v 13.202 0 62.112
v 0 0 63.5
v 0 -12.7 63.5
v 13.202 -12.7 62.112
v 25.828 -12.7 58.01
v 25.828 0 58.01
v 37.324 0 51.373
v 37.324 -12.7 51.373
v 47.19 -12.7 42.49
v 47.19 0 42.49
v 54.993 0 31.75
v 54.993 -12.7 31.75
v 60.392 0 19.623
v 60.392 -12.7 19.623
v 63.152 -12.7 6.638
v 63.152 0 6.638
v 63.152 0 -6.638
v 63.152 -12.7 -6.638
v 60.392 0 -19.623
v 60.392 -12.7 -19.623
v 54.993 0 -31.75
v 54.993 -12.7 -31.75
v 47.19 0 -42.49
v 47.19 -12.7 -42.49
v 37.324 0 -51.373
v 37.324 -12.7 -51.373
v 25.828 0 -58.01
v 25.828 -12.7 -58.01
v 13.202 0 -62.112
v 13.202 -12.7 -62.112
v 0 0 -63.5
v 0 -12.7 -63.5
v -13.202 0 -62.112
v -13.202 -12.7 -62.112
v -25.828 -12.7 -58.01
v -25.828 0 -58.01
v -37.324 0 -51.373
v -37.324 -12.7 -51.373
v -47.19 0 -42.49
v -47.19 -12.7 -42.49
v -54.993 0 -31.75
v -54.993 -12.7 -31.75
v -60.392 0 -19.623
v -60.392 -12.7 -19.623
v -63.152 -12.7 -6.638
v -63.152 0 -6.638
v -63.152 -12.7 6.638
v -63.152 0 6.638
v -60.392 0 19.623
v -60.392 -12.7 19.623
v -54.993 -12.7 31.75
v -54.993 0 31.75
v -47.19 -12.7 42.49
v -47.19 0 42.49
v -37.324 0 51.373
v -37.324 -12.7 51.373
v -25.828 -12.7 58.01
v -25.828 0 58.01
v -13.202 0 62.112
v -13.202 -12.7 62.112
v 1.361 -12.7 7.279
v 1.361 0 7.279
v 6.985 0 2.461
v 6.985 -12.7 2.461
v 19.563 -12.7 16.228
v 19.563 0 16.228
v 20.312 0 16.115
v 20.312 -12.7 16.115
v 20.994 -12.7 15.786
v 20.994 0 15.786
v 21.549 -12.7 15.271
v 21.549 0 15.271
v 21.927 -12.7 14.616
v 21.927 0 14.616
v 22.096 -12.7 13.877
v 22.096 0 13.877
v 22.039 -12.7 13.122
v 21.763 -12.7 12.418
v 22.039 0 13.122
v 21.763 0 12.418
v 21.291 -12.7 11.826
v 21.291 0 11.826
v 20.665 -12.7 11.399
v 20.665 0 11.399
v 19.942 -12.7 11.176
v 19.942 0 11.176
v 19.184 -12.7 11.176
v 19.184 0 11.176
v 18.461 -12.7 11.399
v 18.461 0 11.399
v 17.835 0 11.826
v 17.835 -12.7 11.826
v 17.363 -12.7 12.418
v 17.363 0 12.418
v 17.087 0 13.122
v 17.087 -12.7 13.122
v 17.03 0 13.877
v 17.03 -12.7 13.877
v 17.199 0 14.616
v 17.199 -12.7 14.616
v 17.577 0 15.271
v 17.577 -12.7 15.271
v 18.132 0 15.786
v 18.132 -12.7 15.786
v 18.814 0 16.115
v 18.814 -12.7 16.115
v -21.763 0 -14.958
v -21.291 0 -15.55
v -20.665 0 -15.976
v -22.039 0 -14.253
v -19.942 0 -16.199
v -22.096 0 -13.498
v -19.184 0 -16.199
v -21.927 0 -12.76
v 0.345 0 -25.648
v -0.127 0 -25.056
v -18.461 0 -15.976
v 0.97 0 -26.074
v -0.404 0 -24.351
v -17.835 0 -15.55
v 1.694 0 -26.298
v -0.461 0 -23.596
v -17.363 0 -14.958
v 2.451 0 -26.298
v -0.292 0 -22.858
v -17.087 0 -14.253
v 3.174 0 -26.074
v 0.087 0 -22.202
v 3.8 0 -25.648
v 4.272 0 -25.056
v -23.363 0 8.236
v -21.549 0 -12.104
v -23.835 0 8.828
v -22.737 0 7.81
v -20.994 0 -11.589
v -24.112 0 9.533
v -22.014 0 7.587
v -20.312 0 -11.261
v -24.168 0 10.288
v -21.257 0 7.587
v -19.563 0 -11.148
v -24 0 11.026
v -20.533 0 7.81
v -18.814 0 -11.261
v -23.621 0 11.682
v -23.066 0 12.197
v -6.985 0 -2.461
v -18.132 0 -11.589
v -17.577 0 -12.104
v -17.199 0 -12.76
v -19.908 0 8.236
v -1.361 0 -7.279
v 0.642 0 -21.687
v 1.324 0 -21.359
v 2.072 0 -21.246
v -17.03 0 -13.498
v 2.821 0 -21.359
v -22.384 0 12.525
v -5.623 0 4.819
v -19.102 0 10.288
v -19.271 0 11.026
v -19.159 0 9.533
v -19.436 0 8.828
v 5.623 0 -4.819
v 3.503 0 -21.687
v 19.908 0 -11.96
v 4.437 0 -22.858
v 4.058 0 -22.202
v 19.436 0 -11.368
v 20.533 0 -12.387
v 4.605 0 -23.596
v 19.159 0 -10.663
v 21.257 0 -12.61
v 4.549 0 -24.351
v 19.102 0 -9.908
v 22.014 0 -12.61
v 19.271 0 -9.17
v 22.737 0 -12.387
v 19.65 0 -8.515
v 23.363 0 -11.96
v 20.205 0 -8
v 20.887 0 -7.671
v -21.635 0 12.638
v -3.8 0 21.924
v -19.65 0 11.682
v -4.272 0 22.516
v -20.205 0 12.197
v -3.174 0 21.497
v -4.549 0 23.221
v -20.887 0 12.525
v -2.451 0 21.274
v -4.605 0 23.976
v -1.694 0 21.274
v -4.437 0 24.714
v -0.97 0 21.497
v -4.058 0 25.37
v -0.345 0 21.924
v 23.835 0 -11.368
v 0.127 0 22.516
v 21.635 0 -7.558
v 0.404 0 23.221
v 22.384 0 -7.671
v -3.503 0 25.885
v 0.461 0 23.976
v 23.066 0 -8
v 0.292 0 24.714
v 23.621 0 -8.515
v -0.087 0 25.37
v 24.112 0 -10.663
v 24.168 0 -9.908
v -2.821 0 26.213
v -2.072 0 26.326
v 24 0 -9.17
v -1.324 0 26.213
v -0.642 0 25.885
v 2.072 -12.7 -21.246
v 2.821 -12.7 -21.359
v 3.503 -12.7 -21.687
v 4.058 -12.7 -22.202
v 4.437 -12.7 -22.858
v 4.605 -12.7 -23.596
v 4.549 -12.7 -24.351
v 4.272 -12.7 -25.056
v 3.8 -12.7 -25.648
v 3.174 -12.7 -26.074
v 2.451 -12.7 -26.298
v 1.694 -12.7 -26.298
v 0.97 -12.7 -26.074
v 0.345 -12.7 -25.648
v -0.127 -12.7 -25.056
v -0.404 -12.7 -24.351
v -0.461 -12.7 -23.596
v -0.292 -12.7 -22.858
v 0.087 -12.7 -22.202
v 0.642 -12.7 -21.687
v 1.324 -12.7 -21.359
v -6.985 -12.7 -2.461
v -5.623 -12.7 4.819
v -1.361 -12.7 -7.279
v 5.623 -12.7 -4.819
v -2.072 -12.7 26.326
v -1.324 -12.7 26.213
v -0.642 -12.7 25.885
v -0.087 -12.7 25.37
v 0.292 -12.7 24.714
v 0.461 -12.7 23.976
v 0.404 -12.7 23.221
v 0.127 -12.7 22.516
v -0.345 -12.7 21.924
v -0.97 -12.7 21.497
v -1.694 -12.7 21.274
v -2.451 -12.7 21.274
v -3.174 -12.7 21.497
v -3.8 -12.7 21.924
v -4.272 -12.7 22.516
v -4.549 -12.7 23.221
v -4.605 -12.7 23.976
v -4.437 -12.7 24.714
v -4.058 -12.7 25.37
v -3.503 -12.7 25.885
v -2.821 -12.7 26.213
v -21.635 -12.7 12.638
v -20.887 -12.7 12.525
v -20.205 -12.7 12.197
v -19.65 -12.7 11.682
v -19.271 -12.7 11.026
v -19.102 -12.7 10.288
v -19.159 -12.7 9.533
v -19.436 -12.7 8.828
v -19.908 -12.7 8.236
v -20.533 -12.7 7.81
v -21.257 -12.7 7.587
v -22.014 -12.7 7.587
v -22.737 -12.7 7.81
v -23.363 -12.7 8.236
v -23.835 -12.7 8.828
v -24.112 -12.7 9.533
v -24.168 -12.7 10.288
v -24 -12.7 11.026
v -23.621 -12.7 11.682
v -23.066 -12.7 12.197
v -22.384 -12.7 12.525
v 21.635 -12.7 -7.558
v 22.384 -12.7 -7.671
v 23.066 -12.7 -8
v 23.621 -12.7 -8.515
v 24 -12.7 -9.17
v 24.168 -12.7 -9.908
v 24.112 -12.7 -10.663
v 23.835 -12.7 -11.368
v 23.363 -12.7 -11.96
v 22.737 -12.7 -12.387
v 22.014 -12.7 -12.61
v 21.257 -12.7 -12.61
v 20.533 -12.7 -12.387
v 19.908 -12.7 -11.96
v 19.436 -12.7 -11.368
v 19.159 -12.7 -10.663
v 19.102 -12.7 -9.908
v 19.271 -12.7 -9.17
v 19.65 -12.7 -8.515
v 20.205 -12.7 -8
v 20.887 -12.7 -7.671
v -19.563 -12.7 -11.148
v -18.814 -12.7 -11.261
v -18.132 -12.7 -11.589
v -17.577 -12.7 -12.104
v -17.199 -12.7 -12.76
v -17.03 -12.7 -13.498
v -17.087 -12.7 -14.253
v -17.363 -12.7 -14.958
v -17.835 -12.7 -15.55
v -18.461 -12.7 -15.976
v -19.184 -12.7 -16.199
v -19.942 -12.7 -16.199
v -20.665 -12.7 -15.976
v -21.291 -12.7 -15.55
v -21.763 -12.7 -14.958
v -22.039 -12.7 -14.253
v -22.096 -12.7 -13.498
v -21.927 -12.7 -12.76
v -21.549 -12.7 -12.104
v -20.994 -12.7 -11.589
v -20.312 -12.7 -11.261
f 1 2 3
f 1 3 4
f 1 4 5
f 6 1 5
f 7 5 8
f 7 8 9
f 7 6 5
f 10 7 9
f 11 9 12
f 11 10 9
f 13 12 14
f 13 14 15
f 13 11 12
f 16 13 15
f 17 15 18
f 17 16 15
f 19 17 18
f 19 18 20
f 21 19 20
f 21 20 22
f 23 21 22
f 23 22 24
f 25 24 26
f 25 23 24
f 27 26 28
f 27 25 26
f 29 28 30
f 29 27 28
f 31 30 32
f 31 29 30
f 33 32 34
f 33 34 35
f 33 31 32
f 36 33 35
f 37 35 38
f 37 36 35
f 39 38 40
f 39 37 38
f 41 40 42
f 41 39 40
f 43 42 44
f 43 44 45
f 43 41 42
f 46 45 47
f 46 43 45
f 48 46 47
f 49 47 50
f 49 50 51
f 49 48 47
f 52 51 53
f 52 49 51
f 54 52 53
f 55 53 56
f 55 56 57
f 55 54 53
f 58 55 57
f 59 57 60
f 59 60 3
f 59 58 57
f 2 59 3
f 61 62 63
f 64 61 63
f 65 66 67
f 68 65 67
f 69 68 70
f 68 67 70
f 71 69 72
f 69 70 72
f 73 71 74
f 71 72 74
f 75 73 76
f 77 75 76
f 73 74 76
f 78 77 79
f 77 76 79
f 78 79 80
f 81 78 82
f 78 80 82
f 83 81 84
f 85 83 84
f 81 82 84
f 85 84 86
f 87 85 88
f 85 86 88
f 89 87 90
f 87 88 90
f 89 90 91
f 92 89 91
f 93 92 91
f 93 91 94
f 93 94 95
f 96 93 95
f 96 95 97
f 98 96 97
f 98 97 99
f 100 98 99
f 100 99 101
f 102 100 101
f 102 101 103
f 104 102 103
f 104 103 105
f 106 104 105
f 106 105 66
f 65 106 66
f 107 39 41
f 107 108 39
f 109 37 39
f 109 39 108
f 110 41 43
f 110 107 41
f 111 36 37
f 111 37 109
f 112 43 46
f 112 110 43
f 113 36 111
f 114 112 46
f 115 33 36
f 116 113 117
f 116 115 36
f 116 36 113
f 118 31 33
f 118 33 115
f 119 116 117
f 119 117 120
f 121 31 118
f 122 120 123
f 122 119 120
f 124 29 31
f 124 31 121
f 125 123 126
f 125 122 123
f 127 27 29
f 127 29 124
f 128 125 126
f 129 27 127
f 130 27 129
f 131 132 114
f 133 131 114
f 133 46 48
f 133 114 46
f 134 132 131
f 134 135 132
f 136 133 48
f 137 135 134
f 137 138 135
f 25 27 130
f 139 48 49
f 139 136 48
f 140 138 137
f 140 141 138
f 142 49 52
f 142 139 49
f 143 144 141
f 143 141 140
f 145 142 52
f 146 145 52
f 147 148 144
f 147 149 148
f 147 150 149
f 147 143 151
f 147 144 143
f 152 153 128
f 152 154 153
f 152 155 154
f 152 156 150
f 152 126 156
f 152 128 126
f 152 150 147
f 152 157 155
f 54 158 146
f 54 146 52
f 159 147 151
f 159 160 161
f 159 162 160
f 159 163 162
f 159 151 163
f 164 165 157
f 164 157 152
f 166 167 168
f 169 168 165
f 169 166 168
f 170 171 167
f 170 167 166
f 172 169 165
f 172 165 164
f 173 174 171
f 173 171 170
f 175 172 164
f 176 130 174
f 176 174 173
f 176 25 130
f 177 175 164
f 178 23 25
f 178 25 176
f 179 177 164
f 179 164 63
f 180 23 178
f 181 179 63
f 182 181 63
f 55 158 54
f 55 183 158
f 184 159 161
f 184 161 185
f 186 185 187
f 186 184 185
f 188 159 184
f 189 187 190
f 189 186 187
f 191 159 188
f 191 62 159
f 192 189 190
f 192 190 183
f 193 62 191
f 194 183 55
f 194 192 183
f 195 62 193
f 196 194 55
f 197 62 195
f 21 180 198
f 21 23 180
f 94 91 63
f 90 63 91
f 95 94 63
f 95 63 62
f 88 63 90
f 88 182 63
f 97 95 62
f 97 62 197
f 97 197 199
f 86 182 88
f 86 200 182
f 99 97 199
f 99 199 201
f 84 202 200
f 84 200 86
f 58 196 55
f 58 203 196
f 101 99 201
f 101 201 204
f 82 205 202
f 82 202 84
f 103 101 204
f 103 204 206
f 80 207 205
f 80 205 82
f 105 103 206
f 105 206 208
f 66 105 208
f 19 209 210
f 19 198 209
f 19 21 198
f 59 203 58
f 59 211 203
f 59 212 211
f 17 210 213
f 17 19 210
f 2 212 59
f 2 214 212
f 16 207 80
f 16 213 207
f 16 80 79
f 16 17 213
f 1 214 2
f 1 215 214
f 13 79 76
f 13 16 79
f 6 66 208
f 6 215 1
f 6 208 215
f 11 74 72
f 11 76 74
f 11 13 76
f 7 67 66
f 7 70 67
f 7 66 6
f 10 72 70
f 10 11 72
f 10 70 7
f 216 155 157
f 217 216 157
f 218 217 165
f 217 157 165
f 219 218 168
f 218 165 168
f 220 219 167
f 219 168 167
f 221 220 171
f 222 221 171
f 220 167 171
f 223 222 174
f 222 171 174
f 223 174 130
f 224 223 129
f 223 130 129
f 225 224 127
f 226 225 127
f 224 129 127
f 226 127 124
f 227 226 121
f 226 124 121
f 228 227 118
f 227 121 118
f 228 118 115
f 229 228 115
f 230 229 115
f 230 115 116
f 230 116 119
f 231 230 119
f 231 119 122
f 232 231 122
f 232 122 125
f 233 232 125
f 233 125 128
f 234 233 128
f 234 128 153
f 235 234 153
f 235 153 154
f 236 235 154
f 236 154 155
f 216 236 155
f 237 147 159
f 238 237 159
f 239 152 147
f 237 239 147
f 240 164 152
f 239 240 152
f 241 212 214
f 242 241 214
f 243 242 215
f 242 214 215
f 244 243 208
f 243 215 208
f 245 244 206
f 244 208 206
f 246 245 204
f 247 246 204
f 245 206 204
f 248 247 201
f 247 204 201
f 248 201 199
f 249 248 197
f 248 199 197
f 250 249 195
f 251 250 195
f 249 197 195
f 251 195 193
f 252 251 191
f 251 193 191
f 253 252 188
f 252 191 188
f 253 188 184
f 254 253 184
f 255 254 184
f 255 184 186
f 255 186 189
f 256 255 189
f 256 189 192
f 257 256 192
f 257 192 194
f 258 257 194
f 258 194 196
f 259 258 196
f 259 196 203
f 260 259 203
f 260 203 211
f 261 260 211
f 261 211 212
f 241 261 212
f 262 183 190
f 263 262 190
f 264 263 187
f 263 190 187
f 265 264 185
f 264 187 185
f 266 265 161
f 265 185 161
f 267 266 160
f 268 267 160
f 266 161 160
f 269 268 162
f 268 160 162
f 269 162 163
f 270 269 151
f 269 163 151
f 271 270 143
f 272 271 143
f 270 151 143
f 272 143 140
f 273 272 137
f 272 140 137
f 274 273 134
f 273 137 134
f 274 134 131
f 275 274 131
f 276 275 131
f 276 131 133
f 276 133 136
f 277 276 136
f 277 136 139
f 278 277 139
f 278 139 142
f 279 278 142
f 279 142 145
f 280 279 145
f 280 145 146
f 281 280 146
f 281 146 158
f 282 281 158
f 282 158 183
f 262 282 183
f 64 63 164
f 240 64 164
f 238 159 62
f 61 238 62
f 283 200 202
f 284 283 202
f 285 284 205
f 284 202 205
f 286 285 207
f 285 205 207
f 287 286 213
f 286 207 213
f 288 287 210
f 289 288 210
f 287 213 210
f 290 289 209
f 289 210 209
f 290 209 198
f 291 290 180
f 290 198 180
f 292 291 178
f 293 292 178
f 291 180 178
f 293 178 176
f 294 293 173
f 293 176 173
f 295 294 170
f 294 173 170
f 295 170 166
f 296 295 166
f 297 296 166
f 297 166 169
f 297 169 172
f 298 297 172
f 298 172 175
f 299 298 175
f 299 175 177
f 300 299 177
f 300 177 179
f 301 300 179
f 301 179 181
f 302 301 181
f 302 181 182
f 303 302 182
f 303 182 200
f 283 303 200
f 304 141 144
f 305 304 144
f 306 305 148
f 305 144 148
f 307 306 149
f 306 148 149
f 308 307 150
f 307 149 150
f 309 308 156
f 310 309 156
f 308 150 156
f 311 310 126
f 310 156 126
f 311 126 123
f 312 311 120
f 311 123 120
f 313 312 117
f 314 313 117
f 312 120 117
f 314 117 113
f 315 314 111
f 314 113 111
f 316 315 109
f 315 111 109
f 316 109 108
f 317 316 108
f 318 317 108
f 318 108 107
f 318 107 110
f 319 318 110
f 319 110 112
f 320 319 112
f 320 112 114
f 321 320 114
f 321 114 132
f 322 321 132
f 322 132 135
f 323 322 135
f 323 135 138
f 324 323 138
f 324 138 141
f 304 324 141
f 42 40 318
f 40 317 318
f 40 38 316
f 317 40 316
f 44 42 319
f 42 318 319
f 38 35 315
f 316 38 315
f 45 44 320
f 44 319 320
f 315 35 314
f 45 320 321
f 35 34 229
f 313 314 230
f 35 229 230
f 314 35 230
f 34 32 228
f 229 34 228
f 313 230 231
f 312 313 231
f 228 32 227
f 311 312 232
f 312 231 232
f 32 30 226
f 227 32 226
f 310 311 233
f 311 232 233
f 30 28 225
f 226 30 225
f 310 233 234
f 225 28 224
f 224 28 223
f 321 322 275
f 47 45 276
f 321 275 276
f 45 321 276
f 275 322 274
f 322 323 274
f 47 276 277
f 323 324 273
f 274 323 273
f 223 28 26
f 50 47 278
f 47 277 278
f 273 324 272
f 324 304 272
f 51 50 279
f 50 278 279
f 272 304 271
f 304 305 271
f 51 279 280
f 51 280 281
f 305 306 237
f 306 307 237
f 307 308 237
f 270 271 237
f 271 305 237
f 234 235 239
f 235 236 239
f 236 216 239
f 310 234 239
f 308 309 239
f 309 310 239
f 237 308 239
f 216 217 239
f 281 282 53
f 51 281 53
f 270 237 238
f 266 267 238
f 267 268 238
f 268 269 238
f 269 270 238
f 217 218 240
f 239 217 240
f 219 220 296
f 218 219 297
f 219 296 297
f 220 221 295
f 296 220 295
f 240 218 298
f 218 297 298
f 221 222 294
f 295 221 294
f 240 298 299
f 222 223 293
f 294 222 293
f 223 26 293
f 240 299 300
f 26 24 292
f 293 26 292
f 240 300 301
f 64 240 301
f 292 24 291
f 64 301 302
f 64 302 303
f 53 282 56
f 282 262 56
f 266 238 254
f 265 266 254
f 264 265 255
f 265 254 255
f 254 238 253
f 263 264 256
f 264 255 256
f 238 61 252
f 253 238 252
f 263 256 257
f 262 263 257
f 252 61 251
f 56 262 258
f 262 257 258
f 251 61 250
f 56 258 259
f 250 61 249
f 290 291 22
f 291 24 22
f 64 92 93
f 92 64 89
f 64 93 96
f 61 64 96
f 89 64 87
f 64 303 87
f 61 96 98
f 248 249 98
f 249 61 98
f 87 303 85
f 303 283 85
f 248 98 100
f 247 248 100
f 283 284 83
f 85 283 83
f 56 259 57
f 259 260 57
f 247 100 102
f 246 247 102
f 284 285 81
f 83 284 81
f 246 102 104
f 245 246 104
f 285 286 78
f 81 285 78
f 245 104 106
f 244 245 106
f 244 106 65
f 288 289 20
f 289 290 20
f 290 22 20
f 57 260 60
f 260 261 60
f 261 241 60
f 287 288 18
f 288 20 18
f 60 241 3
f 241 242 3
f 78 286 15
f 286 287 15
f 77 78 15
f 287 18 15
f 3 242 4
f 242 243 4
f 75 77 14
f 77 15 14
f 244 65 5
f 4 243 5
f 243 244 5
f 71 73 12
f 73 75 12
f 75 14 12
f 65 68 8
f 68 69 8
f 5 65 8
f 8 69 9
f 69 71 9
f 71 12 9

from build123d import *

# Parameters (mm, degrees)
SKETCH1_R           = 63.5
BOSS_EXTRUDE1_DEPTH = 12.7
SKETCH7_R           = 2.54
CUT_EXTRUDE2_DEPTH  = 91.696141042
CUT_EXTRUDE3_DEPTH  = 91.696141042


with BuildPart() as part:
    # Sketch1 → Boss-Extrude1 (new body)
    with BuildSketch(Plane(origin=(0, 0, 0), x_dir=(1, 0, 0), z_dir=(0, 1, 0))):
        with Locations(Location((0, 0, 0), (0, 0, 270))):
            Circle(SKETCH1_R)
    extrude(amount=-BOSS_EXTRUDE1_DEPTH)

    # Sketch7 → Cut-Extrude2 (cut, through all)
    with BuildSketch(Plane(origin=(0, 0, 0), x_dir=(1, 0, 0), z_dir=(0, 1, 0))):
        with Locations(Location((19.563011922, -13.687656502, 0), (0, 0, 270))):
            Circle(SKETCH7_R)
        with Locations(Location((21.635364211, 10.098237048, 0), (0, 0, 270))):
            Circle(SKETCH7_R)
        with Locations(Location((2.072352288, 23.78589355, 0), (0, 0, 270))):
            Circle(SKETCH7_R)
        with Locations(Location((-19.563011922, 13.687656502, 0), (0, 0, 270))):
            Circle(SKETCH7_R)
        with Locations(Location((-21.635364211, -10.098237048, 0), (0, 0, 270))):
            Circle(SKETCH7_R)
        with Locations(Location((-2.072352288, -23.78589355, 0), (0, 0, 270))):
            Circle(SKETCH7_R)
    extrude(amount=-CUT_EXTRUDE2_DEPTH, mode=Mode.SUBTRACT)

    # Sketch8 → Cut-Extrude3 (cut, through all)
    with BuildSketch(Plane(origin=(0, 0, 0), x_dir=(1, 0, 0), z_dir=(0, 1, 0))):
        Polygon((-5.623469851, -4.818771956), (1.361444003, -7.279453727), (6.984913855, -2.46068177), (5.623469851, 4.818771956), (-1.361444003, 7.279453727), (-6.984913855, 2.46068177), align=None)
    extrude(amount=-CUT_EXTRUDE3_DEPTH, mode=Mode.SUBTRACT)


solid = part.part
